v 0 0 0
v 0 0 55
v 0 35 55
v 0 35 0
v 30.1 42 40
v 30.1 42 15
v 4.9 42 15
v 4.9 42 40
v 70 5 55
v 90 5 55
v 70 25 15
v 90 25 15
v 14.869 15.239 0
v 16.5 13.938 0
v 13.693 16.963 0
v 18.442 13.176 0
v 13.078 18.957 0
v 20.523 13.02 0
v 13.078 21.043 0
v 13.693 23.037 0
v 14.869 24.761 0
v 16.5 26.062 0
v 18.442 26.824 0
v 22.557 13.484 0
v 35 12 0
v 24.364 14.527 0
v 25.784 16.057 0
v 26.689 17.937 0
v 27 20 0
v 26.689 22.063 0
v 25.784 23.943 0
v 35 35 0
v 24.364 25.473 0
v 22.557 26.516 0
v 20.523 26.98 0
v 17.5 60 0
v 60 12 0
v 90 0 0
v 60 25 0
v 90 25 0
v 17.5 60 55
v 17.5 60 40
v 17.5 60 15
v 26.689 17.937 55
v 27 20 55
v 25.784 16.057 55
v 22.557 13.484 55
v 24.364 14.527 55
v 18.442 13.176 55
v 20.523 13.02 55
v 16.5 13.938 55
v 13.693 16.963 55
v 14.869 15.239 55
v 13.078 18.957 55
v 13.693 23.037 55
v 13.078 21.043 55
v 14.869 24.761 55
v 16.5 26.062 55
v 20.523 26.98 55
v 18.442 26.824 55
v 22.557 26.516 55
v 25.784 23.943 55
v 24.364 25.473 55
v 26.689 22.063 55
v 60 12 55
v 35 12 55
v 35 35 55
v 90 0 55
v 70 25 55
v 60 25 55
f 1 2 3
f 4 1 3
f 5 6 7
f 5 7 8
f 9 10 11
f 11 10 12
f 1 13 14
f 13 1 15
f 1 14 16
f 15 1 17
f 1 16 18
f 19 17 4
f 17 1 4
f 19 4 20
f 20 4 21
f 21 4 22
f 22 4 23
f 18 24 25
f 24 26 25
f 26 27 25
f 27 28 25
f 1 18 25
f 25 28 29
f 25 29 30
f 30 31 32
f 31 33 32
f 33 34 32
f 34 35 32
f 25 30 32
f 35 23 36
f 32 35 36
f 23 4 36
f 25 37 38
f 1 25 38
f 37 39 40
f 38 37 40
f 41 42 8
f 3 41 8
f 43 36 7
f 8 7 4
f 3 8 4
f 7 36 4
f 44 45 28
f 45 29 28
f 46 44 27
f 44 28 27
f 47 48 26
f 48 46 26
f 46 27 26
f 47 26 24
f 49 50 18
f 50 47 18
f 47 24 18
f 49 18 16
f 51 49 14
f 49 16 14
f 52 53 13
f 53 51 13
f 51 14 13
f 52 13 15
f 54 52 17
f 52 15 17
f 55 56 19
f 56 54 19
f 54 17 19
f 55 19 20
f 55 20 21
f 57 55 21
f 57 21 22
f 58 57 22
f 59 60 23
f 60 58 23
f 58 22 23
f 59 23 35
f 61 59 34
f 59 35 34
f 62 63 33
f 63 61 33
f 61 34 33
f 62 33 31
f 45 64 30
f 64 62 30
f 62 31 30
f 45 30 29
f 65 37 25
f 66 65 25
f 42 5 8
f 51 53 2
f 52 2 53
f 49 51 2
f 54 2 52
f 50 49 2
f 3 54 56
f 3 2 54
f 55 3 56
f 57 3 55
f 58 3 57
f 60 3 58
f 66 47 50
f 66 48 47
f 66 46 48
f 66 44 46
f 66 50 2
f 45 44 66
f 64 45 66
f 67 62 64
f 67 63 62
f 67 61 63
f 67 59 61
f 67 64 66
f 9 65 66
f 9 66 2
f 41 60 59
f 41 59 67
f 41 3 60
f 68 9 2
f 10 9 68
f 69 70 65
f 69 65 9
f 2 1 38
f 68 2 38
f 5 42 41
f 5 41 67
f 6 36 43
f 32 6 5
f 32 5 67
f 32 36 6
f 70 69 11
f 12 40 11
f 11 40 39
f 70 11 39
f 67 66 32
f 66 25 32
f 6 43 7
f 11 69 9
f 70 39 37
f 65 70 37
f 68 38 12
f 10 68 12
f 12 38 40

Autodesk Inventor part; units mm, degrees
ref_plane "YZ Plane" through (0, 0, 0) normal (1, 0, 0) x (0, 1, 0)
ref_plane "XZ Plane" through (0, 0, 0) normal (0, 1, 0) x (-1, 0, 0)
ref_plane "XY Plane" through (0, 0, 0) normal (0, 0, 1) x (1, 0, 0)
sketch "Sketch1" plane through (0, 0, 0) normal (0, 0, 1) x (1, 0, 0)
  line L0 (0, 0) -> (90, 0)
  line L1 (90, 0) -> (90, 25)
  line L2 (90, 25) -> (60, 25)
  line L3 (60, 25) -> (60, 12)
  line L4 (60, 12) -> (35, 12)
  line L5 (35, 12) -> (35, 35)
  line L6 (0, 0) -> (0, 35)
  line L7 (17.5, 60) -> (0, 35)
  line L8 (17.5, 60) -> (35, 35)
  circle A0 centre (20, 20) radius 7
  dimension "d0" = 90
  dimension "d1" = 25
extrude "Extrusion1" add sketch "Sketch1" along normal blind 55
sketch "Sketch2" plane through (90, 0, 0) normal (1, 0, 0) x (0, 0, -1)
  line L0 (0, 25) -> (-55, 25) projected
  line L1 (-15, 25) -> (-55, 25)
  line L2 (-55, 35) -> (-55, 0) projected
  line L3 (-55, 5) -> (-15, 25)
  line L4 (-55, 25) -> (-55, 5)
  line L5 (-55, 12) -> (-55, 35) projected
  point P0 (0, 0)
extrude "Extrusion2" cut sketch "Sketch2" against normal blind 20
sketch "Sketch3" plane through (35, 12, 0) normal (1, 0, 0) x (0, 0, -1)
  line L0 (0, 48) -> (-55, 48) projected
  line L1 (-15, 48) -> (-15, 30)
  line L2 (0, 23) -> (-55, 23) projected
  line L3 (-15, 30) -> (-40, 30)
  line L4 (-40, 30) -> (-40, 48)
  line L5 (-15, 48) -> (-40, 48)
  point P0 (0, -12)
  dimension "d6" = 18
extrude "Extrusion3" cut sketch "Sketch3" against normal blind 35
properties part number "P4-10"
